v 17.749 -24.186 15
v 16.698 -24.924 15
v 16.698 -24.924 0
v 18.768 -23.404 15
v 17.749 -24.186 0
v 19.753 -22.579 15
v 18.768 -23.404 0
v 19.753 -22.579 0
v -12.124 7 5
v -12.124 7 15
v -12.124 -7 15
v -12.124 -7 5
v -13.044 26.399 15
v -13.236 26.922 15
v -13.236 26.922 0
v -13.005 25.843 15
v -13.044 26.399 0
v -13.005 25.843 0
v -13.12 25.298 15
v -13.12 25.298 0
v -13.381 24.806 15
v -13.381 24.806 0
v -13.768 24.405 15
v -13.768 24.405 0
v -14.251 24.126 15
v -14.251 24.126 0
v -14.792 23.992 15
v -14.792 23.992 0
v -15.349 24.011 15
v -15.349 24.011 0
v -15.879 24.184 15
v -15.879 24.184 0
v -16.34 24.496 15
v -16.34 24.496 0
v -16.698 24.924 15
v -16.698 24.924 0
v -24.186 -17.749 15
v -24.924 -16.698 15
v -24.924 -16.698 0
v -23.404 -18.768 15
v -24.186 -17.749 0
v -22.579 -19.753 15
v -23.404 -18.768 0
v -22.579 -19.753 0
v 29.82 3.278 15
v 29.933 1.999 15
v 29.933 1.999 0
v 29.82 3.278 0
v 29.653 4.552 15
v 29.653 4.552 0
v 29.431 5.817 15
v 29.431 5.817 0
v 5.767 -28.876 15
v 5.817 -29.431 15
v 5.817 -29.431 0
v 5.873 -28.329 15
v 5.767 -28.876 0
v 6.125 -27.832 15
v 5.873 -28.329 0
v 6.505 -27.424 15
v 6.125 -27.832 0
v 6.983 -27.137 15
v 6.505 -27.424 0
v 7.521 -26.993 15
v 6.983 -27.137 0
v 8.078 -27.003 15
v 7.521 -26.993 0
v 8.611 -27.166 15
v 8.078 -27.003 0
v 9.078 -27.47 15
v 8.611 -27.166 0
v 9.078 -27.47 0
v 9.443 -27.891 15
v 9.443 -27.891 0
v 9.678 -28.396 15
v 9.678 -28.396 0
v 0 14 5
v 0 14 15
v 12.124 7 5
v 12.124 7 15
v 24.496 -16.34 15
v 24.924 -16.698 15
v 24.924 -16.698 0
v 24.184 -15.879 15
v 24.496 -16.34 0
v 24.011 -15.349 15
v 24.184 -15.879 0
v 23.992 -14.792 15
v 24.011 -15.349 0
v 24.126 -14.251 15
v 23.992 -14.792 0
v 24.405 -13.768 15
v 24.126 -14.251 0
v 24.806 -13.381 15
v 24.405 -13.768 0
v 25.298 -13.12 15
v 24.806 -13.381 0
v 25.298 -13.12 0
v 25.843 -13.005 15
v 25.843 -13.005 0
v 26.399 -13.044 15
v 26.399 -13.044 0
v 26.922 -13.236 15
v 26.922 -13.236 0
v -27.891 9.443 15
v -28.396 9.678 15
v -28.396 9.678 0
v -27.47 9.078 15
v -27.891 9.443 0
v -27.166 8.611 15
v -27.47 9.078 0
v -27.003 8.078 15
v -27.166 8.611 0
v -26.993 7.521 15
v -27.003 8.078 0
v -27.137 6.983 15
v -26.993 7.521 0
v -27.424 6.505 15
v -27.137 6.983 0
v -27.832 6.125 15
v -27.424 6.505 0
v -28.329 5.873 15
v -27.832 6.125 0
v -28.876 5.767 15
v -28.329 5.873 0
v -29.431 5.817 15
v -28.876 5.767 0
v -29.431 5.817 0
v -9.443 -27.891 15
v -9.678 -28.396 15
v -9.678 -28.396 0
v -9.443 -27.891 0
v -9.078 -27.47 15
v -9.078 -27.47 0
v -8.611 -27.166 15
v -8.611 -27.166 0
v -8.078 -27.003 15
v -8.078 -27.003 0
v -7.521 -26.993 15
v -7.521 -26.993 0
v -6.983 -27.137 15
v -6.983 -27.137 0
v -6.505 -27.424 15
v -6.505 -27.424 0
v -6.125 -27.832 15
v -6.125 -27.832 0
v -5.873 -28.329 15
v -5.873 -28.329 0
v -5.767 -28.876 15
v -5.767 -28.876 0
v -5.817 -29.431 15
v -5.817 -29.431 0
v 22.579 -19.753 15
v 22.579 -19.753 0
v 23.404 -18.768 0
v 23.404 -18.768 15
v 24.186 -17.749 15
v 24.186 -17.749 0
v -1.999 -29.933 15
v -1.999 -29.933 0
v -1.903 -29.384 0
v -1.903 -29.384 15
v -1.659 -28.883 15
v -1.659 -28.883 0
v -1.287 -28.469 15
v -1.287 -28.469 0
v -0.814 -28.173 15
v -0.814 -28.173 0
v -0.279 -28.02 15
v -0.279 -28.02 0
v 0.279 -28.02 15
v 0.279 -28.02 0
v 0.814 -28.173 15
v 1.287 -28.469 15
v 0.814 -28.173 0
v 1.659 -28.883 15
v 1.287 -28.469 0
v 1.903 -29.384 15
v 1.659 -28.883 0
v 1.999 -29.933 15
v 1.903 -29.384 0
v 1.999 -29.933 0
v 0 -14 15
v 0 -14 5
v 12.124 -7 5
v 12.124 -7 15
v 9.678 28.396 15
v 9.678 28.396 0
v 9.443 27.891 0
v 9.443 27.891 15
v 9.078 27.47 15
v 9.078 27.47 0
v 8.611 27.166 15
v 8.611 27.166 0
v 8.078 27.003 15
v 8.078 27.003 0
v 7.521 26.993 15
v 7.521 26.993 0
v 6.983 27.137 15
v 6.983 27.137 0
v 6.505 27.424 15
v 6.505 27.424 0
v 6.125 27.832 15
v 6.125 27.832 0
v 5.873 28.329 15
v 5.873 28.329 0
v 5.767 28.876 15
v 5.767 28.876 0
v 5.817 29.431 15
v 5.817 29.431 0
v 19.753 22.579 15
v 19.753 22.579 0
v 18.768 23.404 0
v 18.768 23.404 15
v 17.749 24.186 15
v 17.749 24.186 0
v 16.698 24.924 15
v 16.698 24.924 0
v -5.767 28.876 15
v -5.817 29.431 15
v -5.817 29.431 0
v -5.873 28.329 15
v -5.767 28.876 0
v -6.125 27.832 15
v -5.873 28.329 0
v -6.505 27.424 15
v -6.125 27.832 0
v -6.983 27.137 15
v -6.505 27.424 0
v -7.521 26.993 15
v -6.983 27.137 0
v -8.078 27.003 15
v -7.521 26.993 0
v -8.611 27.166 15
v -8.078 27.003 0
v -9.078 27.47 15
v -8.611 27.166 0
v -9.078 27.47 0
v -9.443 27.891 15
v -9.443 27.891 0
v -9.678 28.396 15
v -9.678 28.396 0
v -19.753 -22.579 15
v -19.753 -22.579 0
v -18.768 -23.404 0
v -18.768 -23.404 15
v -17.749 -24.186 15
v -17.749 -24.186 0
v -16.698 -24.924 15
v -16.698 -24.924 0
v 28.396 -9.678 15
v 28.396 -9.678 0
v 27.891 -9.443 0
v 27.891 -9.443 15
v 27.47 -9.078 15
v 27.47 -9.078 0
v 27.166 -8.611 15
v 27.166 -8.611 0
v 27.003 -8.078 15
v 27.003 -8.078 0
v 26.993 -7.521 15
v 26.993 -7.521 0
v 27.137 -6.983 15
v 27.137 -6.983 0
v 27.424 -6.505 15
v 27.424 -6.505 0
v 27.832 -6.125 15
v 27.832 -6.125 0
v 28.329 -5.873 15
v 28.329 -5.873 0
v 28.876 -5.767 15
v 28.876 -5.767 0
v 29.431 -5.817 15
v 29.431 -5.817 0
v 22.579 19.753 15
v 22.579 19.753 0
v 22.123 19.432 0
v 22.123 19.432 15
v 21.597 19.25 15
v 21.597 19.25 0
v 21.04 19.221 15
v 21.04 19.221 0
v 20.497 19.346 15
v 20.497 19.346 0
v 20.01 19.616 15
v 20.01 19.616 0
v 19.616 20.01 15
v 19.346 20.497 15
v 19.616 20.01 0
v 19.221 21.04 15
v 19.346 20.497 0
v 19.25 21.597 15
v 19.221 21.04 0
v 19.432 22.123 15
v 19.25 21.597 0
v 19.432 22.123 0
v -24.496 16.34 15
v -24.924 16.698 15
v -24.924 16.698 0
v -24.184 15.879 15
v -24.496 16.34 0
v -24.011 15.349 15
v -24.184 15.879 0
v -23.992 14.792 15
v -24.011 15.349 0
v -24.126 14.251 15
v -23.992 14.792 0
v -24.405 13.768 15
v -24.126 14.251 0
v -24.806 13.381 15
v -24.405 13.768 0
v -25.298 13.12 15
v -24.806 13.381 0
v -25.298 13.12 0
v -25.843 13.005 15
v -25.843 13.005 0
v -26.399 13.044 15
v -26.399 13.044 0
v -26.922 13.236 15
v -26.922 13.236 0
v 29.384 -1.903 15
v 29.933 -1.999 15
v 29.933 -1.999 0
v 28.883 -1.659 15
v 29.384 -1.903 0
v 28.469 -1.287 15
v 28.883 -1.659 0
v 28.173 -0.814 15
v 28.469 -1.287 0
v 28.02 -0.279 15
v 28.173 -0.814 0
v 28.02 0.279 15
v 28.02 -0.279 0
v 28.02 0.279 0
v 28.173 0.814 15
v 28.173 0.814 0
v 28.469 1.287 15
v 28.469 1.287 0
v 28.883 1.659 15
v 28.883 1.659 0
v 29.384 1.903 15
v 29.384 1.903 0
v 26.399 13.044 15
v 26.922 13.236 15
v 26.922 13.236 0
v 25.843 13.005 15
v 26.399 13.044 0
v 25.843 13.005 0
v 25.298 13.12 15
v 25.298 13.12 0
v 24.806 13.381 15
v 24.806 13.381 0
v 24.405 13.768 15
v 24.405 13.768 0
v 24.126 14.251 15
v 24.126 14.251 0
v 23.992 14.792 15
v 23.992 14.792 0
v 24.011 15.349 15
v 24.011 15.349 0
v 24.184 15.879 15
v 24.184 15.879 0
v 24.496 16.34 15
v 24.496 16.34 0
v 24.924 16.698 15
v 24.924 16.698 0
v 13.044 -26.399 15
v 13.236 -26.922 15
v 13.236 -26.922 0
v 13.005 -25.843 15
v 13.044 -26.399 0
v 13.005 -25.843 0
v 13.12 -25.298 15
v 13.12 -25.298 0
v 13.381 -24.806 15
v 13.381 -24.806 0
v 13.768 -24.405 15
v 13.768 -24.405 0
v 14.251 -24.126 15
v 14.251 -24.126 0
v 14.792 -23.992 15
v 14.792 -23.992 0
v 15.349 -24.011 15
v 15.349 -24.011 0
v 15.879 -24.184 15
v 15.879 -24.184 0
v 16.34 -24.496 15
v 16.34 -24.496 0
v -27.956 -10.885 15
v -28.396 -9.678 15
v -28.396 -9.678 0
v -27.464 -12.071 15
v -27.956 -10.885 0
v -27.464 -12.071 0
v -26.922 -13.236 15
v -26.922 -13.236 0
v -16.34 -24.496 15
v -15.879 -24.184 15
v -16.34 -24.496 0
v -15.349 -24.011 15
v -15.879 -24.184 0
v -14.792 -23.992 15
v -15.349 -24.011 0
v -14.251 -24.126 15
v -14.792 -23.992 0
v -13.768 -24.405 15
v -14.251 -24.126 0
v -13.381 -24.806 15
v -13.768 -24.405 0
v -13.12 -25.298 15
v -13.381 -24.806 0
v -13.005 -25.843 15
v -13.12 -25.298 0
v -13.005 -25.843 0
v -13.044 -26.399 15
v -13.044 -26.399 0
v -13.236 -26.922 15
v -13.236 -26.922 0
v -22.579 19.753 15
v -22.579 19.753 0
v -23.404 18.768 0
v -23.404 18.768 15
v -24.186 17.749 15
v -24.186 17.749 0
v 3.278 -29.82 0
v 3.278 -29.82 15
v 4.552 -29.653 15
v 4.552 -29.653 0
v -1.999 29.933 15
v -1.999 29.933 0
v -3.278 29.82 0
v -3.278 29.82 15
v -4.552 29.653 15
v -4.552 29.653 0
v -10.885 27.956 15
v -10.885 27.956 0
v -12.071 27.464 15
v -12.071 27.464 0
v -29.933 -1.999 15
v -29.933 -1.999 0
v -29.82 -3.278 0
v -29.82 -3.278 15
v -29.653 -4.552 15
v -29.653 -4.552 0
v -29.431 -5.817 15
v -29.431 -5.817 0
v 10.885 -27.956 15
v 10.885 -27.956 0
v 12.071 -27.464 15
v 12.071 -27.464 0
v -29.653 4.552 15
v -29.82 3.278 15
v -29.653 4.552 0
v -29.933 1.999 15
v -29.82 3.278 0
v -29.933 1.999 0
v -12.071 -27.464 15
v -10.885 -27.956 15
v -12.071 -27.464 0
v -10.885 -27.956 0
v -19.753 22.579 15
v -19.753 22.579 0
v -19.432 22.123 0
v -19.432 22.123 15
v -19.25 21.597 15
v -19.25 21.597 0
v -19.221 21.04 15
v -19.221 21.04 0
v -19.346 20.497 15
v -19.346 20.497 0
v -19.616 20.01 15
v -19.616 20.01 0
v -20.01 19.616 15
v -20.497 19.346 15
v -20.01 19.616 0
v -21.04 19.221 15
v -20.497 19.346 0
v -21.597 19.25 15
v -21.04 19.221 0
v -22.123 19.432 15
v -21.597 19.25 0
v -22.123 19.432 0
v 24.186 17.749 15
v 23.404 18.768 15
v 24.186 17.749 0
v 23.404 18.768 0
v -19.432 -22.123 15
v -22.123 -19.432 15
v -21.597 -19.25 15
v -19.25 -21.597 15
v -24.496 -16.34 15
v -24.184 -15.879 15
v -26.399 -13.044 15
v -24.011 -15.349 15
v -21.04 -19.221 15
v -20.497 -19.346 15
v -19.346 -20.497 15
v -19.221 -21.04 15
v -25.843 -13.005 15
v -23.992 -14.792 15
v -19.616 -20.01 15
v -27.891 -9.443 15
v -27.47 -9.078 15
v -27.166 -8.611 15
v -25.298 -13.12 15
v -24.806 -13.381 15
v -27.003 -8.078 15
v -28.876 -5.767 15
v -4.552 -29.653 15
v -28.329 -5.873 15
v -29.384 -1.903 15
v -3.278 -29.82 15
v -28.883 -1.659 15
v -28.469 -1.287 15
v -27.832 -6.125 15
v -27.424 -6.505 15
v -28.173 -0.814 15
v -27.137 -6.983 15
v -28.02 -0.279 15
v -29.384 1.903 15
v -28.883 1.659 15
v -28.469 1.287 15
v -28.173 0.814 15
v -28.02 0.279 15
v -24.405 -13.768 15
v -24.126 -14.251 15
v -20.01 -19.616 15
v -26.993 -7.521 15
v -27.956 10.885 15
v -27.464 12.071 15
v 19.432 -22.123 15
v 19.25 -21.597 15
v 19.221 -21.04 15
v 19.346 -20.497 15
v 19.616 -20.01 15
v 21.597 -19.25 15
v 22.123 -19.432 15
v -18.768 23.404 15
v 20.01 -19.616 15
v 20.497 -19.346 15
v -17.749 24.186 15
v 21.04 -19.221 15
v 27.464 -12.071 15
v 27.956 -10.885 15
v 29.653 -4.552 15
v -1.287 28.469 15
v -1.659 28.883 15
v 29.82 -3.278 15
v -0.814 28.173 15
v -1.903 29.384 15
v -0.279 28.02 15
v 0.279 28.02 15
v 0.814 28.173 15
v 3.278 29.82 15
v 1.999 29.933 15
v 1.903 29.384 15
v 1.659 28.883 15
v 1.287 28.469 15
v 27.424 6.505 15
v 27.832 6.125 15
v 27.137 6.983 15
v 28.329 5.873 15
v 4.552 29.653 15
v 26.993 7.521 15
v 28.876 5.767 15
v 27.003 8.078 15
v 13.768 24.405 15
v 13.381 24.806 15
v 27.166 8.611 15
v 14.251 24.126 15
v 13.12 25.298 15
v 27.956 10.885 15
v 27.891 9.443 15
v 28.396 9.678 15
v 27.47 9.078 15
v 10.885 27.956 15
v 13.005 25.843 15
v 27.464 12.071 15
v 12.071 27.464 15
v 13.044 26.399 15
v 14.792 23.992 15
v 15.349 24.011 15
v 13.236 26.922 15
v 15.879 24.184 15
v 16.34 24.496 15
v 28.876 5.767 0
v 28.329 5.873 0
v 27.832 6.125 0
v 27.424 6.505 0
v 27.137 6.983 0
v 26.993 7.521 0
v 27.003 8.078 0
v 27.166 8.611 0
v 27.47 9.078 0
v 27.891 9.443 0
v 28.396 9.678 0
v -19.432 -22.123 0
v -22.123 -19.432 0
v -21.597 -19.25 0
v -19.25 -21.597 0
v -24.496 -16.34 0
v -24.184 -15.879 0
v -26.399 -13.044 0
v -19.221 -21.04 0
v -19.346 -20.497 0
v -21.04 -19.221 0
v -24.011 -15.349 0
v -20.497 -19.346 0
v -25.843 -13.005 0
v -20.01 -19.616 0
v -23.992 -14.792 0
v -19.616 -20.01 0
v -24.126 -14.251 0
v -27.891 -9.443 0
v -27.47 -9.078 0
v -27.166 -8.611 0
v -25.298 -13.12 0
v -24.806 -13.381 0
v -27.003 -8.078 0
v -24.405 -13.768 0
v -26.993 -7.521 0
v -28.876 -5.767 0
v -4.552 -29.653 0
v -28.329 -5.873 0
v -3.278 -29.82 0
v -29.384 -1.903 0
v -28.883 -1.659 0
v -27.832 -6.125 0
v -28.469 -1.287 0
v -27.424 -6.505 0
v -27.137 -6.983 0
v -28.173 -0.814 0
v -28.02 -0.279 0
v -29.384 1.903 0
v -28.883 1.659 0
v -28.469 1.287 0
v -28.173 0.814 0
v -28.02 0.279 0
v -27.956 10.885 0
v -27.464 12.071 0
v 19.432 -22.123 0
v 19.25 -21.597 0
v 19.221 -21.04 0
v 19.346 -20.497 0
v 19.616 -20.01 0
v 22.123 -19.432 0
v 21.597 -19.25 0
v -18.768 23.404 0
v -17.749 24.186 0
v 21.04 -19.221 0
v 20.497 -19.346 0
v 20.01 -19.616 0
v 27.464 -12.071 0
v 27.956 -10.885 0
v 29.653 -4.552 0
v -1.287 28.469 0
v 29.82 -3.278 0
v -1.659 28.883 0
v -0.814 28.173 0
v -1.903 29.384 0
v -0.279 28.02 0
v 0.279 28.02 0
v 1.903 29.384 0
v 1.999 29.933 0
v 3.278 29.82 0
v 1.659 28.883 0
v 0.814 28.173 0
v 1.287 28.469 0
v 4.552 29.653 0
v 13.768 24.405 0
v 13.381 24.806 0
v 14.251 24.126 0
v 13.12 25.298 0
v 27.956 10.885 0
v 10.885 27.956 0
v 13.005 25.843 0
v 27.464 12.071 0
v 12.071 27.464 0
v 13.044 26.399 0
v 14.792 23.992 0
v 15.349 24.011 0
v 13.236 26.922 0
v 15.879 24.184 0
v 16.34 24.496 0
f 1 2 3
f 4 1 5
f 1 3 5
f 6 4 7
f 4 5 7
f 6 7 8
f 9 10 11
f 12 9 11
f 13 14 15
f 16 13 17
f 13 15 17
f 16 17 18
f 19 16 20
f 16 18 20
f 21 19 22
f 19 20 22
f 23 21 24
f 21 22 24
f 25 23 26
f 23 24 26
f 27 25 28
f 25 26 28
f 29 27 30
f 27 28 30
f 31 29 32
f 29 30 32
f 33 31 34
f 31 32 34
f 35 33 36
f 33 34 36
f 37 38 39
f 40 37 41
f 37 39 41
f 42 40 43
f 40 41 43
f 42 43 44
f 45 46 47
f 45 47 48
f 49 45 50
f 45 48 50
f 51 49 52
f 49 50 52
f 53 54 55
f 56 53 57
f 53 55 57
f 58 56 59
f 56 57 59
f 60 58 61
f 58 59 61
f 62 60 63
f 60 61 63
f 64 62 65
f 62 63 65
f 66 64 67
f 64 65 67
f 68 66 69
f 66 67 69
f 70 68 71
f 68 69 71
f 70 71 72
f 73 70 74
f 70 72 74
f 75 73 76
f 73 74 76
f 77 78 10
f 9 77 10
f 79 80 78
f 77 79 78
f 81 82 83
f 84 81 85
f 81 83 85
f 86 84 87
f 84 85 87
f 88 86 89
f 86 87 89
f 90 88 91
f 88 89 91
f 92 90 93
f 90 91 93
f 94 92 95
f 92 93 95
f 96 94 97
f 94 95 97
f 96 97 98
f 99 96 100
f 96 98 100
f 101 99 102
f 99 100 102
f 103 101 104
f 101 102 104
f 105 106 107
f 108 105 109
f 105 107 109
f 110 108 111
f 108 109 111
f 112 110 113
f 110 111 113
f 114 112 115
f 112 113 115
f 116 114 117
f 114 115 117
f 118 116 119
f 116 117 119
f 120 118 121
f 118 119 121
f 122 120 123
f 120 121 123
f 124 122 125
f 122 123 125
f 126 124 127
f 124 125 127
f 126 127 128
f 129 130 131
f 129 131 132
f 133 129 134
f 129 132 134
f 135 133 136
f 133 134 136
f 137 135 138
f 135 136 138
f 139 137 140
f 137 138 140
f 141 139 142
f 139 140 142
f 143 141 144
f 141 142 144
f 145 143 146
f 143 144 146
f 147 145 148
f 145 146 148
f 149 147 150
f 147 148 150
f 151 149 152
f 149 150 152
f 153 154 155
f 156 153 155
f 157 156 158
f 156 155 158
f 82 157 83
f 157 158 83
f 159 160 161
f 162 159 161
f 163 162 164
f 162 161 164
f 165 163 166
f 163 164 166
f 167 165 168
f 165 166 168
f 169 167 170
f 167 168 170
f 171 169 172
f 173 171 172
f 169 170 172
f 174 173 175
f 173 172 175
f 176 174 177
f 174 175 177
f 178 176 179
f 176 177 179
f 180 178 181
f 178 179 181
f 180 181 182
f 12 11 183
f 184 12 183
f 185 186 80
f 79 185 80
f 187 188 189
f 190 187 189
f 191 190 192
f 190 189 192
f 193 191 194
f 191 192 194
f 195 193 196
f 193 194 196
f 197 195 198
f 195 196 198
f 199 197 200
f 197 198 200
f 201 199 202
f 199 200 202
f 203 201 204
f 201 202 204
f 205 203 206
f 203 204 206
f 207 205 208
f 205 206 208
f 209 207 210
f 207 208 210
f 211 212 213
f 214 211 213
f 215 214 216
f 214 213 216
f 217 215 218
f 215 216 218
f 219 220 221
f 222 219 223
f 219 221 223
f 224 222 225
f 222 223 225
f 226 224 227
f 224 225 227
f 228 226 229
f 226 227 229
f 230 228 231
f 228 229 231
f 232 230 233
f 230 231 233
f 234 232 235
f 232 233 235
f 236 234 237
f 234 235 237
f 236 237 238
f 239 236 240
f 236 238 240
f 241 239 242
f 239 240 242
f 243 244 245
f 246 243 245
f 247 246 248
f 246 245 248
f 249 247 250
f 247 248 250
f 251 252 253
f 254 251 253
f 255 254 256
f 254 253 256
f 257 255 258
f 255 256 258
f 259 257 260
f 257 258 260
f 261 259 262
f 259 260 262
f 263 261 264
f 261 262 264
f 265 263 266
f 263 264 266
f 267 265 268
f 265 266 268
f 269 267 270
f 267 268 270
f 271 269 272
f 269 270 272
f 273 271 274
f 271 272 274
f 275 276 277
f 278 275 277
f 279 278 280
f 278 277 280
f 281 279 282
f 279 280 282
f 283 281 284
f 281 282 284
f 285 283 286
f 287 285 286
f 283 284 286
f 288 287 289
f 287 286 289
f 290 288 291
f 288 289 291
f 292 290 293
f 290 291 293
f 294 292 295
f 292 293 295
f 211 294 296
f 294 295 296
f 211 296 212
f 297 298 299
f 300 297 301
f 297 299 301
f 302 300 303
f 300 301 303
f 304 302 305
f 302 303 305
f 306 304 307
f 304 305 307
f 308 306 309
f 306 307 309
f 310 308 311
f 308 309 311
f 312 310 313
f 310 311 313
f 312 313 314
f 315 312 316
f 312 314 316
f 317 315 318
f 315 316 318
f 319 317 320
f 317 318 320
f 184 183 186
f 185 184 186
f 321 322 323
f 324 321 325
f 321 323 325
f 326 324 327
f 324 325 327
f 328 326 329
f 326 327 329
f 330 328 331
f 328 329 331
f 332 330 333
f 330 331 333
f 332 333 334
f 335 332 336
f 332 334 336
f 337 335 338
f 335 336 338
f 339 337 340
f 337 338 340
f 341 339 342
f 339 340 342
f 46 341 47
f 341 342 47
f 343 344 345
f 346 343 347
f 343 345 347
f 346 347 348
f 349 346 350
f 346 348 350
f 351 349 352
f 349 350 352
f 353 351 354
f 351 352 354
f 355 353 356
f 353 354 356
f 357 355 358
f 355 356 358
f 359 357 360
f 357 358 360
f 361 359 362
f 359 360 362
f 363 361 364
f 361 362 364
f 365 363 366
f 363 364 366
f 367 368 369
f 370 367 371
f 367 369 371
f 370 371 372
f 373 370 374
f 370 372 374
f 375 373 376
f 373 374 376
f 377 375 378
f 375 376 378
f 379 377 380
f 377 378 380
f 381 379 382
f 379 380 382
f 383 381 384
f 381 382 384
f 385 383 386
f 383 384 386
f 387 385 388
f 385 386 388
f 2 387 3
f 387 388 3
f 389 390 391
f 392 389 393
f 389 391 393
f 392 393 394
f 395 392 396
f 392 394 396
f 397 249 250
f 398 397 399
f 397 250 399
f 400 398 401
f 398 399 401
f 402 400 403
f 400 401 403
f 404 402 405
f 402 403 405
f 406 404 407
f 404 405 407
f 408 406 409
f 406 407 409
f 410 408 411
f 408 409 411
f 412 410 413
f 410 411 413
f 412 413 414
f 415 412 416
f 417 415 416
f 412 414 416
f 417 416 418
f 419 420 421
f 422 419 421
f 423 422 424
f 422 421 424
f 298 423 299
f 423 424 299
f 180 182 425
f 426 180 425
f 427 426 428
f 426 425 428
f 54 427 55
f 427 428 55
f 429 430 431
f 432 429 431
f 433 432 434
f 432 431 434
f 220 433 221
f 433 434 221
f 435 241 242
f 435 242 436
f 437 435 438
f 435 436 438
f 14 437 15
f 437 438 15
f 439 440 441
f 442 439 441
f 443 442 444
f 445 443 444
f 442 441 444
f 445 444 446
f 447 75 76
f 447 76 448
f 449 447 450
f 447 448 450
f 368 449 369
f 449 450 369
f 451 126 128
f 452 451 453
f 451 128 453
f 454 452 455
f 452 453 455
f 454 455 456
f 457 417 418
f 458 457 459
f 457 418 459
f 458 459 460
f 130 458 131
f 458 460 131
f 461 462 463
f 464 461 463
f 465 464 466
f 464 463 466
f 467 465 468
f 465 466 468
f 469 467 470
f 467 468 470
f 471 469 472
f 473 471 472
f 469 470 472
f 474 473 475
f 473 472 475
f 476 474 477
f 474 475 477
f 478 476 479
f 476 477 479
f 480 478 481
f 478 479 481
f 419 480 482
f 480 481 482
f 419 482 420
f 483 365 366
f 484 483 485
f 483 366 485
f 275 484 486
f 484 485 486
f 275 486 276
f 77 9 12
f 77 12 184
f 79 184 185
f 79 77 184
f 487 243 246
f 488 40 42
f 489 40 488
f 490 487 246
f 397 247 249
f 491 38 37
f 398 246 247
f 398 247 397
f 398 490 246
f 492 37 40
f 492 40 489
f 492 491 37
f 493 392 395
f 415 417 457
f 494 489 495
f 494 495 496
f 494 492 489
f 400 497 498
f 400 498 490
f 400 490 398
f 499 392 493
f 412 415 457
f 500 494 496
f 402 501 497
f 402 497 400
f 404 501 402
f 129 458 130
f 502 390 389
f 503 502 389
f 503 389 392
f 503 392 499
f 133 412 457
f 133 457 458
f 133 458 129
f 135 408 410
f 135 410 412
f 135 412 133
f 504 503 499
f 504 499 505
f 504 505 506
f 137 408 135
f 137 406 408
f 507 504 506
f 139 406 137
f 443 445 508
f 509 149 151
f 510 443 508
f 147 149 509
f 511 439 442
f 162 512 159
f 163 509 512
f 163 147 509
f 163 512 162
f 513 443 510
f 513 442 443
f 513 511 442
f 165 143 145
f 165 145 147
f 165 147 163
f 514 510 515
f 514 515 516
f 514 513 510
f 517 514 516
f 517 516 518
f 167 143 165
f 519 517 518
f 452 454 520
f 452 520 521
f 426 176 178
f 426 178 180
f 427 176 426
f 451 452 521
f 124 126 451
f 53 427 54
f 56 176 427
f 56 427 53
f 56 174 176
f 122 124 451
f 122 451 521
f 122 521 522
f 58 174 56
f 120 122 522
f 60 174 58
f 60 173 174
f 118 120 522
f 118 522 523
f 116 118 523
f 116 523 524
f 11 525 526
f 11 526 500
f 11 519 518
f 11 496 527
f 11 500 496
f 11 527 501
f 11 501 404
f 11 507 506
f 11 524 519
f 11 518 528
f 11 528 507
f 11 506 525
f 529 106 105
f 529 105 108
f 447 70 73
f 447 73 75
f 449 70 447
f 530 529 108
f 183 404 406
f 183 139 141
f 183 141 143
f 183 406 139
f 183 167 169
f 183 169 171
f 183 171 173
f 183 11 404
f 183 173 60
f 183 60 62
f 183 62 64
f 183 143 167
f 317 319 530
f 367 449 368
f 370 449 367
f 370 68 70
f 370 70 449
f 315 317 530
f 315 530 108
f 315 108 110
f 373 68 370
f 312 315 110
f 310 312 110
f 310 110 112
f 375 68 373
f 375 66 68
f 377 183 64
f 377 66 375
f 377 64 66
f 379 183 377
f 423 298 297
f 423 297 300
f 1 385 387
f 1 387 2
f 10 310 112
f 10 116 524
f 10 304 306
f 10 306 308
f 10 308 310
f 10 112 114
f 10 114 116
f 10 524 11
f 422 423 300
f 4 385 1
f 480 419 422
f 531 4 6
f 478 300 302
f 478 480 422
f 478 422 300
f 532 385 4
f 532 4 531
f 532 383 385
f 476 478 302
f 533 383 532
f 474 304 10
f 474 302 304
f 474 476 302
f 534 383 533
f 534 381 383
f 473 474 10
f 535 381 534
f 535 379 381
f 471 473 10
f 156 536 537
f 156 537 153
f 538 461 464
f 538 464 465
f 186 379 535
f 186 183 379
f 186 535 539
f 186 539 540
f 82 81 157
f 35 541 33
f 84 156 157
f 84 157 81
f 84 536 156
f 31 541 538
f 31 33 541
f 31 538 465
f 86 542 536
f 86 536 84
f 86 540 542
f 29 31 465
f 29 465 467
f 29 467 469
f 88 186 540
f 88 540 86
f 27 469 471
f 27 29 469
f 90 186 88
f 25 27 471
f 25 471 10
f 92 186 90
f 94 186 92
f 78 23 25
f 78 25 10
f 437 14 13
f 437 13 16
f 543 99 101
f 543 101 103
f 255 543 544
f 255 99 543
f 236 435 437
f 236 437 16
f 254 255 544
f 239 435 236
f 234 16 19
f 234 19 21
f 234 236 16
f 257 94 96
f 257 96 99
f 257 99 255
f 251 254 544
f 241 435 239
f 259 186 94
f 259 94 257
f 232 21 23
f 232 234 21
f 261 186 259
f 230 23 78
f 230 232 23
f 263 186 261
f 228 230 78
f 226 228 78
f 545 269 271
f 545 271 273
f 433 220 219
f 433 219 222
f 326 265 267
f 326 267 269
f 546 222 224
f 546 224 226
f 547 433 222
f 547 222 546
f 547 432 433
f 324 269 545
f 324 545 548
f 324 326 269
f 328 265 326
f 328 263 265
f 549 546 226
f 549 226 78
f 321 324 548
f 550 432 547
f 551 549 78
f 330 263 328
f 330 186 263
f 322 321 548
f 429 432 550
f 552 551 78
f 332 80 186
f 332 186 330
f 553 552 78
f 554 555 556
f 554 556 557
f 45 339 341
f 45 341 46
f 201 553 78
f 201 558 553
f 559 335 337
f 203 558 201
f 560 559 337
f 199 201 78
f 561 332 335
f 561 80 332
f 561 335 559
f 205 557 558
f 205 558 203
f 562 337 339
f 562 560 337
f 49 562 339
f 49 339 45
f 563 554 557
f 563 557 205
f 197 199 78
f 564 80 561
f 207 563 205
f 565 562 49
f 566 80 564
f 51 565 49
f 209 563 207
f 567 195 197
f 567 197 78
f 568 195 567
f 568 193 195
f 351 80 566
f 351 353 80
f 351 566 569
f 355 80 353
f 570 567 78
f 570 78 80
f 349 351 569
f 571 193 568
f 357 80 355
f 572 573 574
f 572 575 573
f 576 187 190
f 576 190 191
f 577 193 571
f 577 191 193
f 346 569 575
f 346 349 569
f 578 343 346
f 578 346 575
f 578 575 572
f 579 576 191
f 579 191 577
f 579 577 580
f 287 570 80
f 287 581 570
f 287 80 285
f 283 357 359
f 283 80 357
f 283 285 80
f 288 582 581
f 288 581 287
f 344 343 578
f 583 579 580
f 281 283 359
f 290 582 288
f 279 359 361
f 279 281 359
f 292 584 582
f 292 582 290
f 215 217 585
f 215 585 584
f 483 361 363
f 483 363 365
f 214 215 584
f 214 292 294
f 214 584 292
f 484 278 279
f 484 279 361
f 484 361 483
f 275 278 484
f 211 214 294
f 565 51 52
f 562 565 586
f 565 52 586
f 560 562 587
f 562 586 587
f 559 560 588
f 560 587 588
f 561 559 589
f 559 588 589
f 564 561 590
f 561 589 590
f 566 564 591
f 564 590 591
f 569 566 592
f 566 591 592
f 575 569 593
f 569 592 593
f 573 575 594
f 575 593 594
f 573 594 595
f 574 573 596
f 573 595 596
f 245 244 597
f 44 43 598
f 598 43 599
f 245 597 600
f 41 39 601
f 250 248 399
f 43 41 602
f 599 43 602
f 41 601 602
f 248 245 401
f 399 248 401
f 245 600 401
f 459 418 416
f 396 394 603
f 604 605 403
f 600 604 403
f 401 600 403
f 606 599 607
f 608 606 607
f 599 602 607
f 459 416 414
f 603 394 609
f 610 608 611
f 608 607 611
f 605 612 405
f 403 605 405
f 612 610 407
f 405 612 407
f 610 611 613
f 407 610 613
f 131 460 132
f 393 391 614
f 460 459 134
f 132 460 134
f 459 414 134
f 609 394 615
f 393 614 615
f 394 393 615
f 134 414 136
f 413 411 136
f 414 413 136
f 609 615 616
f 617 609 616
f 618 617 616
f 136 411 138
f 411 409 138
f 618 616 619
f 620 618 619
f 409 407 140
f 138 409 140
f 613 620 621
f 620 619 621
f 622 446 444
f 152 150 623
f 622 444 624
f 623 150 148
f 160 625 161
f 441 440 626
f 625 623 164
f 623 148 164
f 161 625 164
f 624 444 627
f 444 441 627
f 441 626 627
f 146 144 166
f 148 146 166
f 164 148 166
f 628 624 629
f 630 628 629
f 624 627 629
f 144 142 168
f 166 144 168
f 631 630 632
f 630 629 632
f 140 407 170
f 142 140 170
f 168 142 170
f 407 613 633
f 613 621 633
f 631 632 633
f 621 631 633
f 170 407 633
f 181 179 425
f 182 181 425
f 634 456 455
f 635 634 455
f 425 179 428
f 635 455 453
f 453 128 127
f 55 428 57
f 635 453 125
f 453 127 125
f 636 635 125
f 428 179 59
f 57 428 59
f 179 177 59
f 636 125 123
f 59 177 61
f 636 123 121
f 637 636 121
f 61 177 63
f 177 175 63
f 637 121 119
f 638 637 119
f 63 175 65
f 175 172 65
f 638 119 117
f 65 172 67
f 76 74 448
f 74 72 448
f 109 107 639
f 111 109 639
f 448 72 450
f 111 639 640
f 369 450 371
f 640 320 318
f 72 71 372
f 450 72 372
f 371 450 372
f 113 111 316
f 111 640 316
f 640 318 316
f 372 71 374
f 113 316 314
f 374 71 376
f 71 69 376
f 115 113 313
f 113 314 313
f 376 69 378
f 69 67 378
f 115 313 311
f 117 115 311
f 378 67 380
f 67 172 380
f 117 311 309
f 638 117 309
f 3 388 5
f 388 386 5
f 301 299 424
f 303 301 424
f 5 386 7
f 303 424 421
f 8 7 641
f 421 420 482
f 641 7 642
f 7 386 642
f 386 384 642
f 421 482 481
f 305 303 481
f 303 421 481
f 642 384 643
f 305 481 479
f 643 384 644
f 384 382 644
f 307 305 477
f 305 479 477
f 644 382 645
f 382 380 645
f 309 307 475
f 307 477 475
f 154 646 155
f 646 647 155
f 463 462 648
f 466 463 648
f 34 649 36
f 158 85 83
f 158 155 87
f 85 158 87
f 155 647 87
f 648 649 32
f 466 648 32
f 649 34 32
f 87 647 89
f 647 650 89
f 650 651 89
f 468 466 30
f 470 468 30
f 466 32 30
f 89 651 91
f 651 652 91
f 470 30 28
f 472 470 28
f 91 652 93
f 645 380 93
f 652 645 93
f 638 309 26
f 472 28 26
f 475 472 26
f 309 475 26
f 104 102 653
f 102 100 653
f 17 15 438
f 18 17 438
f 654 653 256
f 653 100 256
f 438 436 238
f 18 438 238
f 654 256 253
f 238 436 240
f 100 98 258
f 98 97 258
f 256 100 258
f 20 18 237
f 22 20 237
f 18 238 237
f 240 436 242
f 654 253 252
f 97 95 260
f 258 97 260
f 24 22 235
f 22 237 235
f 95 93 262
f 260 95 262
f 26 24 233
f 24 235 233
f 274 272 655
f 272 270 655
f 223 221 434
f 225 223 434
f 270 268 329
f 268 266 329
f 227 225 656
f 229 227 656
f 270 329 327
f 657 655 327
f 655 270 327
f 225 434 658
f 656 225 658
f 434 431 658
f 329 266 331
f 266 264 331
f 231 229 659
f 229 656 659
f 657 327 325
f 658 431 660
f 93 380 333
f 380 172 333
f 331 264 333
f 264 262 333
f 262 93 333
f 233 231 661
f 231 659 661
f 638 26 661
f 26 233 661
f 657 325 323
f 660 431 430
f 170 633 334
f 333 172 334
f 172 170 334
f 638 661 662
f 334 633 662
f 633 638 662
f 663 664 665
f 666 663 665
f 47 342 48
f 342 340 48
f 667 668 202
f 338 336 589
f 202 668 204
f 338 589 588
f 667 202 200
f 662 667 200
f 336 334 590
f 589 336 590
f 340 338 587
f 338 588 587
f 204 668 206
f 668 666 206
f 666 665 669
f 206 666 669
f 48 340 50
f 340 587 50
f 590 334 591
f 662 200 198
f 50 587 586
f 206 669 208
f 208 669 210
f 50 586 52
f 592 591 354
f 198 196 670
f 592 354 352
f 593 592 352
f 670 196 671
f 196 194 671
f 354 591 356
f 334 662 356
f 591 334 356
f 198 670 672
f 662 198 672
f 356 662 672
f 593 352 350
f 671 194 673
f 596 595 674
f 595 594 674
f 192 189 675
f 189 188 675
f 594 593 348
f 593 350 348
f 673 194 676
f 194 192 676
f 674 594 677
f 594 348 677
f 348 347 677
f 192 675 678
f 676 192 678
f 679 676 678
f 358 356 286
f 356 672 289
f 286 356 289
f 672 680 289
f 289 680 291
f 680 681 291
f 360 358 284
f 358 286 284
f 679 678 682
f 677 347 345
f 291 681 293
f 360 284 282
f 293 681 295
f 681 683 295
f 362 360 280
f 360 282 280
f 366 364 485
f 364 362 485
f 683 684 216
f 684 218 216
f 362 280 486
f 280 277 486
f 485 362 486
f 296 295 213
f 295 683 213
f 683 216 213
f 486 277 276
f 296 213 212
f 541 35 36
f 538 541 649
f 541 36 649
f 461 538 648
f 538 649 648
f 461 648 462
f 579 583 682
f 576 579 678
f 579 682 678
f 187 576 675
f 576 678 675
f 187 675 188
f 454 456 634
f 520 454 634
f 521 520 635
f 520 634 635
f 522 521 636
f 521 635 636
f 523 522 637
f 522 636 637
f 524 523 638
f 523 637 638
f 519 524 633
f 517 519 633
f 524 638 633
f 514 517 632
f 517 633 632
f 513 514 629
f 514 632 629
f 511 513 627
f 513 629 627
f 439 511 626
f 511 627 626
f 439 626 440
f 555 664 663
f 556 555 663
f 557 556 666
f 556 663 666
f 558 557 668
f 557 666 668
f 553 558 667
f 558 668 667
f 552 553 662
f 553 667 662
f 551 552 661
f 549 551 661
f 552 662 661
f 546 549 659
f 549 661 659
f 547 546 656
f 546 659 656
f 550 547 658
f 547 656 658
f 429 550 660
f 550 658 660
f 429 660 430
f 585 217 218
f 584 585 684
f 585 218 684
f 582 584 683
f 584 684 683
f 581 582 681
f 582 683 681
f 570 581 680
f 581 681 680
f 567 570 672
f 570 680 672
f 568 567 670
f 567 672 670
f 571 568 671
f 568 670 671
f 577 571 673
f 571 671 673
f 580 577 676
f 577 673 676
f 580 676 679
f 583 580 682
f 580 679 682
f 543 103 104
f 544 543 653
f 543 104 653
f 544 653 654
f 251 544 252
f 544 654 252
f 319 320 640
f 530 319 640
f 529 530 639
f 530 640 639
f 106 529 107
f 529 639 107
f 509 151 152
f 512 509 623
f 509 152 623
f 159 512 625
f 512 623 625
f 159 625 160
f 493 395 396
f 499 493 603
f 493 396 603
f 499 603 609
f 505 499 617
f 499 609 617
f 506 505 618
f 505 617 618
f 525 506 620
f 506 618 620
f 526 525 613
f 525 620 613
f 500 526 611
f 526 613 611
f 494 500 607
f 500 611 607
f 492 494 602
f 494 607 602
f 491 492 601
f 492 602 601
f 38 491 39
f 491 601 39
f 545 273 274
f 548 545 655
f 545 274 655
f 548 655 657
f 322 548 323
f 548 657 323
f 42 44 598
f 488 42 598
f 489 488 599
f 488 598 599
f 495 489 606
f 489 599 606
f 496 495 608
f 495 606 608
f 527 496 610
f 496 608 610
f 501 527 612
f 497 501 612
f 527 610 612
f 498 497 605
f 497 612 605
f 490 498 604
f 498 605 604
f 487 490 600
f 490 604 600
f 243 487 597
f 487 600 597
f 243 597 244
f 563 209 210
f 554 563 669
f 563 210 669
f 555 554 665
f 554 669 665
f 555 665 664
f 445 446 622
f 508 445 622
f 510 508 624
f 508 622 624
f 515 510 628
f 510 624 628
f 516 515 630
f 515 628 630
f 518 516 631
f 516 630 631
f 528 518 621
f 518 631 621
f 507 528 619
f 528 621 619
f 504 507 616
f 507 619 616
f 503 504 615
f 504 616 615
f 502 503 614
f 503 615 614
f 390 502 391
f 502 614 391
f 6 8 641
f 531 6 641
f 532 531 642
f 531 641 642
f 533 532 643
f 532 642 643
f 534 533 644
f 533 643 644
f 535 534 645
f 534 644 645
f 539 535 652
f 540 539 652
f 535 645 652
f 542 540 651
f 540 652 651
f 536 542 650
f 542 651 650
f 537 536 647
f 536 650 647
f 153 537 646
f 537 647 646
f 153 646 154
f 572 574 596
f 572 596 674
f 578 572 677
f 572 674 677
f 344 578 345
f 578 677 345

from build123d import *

# Parameters (mm, degrees)
SKETCH1_R           = 30
BOSS_EXTRUDE1_DEPTH = 15
CUT_EXTRUDE1_DEPTH  = 10
SKETCH3_R           = 2
CUT_EXTRUDE2_DEPTH  = 46


with BuildPart() as part:
    # Sketch1 → Boss-Extrude1 (new body)
    with BuildSketch(Plane.XY):
        Circle(SKETCH1_R)
    extrude(amount=BOSS_EXTRUDE1_DEPTH)

    # Sketch2 → Cut-Extrude1 (cut)
    with BuildSketch(Plane.XY.offset(15)):
        Polygon((0, 14), (-12.124355653, 7), (-12.124355653, -7), (0, -14), (12.124355653, -7), (12.124355653, 7), align=None)
    extrude(amount=-CUT_EXTRUDE1_DEPTH, mode=Mode.SUBTRACT)

    # Sketch3 → Cut-Extrude2 (cut, through all)
    with BuildSketch(Plane(origin=(0, 0, 0), x_dir=(-1, 0, 0), z_dir=(0, 0, -1))):
        with Locations((0, 30)):
            Circle(SKETCH3_R)
        with Locations((7.764571353, 28.977774789)):
            Circle(SKETCH3_R)
        with Locations((15, 25.980762114)):
            Circle(SKETCH3_R)
        with Locations((21.213203436, 21.213203436)):
            Circle(SKETCH3_R)
        with Locations((25.980762114, 15)):
            Circle(SKETCH3_R)
        with Locations((28.977774789, 7.764571353)):
            Circle(SKETCH3_R)
        with Locations((30, 0)):
            Circle(SKETCH3_R)
        with Locations((28.977774789, -7.764571353)):
            Circle(SKETCH3_R)
        with Locations((25.980762114, -15)):
            Circle(SKETCH3_R)
        with Locations((21.213203436, -21.213203436)):
            Circle(SKETCH3_R)
        with Locations((15, -25.980762114)):
            Circle(SKETCH3_R)
        with Locations((7.764571353, -28.977774789)):
            Circle(SKETCH3_R)
        with Locations((0, -30)):
            Circle(SKETCH3_R)
        with Locations((-7.764571353, -28.977774789)):
            Circle(SKETCH3_R)
        with Locations((-15, -25.980762114)):
            Circle(SKETCH3_R)
        with Locations((-21.213203436, -21.213203436)):
            Circle(SKETCH3_R)
        with Locations((-25.980762114, -15)):
            Circle(SKETCH3_R)
        with Locations((-28.977774789, -7.764571353)):
            Circle(SKETCH3_R)
        with Locations((-30, 0)):
            Circle(SKETCH3_R)
        with Locations((-28.977774789, 7.764571353)):
            Circle(SKETCH3_R)
        with Locations((-25.980762114, 15)):
            Circle(SKETCH3_R)
        with Locations((-21.213203436, 21.213203436)):
            Circle(SKETCH3_R)
        with Locations((-15, 25.980762114)):
            Circle(SKETCH3_R)
        with Locations((-7.764571353, 28.977774789)):
            Circle(SKETCH3_R)
    extrude(amount=-CUT_EXTRUDE2_DEPTH, mode=Mode.SUBTRACT)


solid = part.part
